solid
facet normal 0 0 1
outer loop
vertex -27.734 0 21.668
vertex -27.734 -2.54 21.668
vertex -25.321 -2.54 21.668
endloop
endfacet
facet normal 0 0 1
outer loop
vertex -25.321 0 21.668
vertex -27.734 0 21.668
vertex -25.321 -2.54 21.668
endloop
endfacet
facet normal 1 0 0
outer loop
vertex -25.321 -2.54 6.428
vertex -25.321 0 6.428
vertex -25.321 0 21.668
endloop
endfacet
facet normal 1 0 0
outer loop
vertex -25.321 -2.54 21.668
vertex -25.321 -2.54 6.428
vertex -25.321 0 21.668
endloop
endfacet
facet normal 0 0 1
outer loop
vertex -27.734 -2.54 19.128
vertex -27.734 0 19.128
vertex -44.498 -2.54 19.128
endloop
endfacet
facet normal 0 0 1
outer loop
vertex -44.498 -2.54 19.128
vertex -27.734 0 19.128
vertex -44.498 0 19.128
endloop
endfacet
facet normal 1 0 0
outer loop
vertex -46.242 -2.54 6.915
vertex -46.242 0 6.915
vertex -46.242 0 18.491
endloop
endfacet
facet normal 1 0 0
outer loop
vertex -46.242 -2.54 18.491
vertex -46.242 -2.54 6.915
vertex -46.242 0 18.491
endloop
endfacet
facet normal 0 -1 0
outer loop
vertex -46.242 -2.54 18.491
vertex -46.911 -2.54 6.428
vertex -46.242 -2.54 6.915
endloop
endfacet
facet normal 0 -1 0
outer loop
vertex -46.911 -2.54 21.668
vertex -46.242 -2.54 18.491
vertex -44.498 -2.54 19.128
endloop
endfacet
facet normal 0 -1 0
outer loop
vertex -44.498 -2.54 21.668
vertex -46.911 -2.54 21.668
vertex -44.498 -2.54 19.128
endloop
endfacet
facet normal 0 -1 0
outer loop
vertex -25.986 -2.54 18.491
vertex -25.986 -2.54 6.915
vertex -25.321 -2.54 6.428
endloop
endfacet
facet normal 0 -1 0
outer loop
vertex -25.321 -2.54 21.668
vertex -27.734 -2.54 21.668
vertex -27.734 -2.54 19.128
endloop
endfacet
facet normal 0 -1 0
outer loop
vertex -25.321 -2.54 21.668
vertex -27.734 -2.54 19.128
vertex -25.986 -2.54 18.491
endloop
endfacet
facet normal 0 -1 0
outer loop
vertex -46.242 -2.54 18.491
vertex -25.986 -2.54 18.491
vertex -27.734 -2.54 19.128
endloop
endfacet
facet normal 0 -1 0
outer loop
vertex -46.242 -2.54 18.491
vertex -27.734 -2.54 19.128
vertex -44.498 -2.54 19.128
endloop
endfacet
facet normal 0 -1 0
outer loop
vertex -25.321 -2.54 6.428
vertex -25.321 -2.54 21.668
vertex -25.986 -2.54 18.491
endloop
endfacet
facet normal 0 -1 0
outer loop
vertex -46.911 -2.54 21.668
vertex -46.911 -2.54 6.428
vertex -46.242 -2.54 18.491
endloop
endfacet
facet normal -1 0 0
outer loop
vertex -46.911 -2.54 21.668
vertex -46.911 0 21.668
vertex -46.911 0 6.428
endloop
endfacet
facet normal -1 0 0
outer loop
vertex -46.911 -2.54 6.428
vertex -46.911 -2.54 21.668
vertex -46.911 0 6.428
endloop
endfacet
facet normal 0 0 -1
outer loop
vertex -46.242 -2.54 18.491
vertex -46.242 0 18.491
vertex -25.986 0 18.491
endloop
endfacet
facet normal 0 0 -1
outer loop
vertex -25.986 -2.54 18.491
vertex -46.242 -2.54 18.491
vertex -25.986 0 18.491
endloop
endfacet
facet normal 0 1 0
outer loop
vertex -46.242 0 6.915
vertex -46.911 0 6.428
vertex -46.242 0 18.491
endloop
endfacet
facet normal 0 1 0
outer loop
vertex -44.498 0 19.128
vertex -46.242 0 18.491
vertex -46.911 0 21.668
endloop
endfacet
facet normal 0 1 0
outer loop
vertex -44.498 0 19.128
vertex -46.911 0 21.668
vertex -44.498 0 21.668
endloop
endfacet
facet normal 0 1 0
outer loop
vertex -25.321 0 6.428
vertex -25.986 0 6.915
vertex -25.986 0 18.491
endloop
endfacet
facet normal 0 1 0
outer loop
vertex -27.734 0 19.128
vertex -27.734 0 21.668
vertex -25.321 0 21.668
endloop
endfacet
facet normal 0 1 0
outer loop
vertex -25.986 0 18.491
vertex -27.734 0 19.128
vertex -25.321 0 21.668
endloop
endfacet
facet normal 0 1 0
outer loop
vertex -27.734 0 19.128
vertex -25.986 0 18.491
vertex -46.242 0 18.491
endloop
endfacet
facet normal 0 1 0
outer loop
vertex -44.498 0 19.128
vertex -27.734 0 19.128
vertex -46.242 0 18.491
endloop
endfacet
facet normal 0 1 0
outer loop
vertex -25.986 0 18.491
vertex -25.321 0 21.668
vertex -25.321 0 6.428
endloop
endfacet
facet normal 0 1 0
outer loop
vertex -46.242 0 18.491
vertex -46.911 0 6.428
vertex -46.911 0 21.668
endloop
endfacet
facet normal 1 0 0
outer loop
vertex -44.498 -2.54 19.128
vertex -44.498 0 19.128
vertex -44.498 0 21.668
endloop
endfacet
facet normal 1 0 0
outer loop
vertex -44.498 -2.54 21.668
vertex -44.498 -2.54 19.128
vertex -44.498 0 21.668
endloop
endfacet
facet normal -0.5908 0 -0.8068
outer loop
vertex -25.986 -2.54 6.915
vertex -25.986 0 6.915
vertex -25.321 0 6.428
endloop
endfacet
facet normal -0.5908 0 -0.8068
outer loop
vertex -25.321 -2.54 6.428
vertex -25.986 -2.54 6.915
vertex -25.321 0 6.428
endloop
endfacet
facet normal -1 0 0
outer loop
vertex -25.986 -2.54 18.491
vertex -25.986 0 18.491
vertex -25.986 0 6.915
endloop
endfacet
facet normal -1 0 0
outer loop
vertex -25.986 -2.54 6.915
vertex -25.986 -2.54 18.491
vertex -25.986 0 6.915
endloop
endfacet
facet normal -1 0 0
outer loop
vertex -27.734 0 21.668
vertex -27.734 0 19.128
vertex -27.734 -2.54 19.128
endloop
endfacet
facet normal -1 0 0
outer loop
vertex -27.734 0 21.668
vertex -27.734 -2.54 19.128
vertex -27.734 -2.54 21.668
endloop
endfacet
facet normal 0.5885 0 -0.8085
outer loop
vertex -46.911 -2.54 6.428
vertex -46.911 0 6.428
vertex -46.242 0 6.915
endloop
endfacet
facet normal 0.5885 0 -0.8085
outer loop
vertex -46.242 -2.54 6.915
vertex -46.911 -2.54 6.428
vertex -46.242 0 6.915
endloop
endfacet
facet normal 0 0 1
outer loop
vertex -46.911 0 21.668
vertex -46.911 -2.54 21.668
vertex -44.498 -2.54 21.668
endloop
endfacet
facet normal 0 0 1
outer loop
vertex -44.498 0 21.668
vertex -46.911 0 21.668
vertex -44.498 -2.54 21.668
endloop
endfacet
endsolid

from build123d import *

# Parameters (mm, degrees)
F0_W     = 2.413
F0_H     = 2.54
F1_DEPTH = 2.54


with BuildPart() as f1:
    # F0 (on Front) → F1 (new body)
    with BuildSketch(Plane.XZ):
        Polygon((-44.497715, 19.128243), (-46.910715, 19.128243), (-46.910715, 6.428243), (-46.24188, 6.91544), (-46.24188, 18.49121), (-25.985625, 18.49121), (-25.985625, 6.91544), (-25.320715, 6.428243), (-25.320715, 19.128243), (-27.733715, 19.128243), align=None)
        with Locations((-45.704215, 20.398243)):
            Rectangle(F0_W, F0_H)
        with Locations((-26.527215, 20.398243)):
            Rectangle(F0_W, F0_H)
    extrude(amount=F1_DEPTH)


solid = f1.part
